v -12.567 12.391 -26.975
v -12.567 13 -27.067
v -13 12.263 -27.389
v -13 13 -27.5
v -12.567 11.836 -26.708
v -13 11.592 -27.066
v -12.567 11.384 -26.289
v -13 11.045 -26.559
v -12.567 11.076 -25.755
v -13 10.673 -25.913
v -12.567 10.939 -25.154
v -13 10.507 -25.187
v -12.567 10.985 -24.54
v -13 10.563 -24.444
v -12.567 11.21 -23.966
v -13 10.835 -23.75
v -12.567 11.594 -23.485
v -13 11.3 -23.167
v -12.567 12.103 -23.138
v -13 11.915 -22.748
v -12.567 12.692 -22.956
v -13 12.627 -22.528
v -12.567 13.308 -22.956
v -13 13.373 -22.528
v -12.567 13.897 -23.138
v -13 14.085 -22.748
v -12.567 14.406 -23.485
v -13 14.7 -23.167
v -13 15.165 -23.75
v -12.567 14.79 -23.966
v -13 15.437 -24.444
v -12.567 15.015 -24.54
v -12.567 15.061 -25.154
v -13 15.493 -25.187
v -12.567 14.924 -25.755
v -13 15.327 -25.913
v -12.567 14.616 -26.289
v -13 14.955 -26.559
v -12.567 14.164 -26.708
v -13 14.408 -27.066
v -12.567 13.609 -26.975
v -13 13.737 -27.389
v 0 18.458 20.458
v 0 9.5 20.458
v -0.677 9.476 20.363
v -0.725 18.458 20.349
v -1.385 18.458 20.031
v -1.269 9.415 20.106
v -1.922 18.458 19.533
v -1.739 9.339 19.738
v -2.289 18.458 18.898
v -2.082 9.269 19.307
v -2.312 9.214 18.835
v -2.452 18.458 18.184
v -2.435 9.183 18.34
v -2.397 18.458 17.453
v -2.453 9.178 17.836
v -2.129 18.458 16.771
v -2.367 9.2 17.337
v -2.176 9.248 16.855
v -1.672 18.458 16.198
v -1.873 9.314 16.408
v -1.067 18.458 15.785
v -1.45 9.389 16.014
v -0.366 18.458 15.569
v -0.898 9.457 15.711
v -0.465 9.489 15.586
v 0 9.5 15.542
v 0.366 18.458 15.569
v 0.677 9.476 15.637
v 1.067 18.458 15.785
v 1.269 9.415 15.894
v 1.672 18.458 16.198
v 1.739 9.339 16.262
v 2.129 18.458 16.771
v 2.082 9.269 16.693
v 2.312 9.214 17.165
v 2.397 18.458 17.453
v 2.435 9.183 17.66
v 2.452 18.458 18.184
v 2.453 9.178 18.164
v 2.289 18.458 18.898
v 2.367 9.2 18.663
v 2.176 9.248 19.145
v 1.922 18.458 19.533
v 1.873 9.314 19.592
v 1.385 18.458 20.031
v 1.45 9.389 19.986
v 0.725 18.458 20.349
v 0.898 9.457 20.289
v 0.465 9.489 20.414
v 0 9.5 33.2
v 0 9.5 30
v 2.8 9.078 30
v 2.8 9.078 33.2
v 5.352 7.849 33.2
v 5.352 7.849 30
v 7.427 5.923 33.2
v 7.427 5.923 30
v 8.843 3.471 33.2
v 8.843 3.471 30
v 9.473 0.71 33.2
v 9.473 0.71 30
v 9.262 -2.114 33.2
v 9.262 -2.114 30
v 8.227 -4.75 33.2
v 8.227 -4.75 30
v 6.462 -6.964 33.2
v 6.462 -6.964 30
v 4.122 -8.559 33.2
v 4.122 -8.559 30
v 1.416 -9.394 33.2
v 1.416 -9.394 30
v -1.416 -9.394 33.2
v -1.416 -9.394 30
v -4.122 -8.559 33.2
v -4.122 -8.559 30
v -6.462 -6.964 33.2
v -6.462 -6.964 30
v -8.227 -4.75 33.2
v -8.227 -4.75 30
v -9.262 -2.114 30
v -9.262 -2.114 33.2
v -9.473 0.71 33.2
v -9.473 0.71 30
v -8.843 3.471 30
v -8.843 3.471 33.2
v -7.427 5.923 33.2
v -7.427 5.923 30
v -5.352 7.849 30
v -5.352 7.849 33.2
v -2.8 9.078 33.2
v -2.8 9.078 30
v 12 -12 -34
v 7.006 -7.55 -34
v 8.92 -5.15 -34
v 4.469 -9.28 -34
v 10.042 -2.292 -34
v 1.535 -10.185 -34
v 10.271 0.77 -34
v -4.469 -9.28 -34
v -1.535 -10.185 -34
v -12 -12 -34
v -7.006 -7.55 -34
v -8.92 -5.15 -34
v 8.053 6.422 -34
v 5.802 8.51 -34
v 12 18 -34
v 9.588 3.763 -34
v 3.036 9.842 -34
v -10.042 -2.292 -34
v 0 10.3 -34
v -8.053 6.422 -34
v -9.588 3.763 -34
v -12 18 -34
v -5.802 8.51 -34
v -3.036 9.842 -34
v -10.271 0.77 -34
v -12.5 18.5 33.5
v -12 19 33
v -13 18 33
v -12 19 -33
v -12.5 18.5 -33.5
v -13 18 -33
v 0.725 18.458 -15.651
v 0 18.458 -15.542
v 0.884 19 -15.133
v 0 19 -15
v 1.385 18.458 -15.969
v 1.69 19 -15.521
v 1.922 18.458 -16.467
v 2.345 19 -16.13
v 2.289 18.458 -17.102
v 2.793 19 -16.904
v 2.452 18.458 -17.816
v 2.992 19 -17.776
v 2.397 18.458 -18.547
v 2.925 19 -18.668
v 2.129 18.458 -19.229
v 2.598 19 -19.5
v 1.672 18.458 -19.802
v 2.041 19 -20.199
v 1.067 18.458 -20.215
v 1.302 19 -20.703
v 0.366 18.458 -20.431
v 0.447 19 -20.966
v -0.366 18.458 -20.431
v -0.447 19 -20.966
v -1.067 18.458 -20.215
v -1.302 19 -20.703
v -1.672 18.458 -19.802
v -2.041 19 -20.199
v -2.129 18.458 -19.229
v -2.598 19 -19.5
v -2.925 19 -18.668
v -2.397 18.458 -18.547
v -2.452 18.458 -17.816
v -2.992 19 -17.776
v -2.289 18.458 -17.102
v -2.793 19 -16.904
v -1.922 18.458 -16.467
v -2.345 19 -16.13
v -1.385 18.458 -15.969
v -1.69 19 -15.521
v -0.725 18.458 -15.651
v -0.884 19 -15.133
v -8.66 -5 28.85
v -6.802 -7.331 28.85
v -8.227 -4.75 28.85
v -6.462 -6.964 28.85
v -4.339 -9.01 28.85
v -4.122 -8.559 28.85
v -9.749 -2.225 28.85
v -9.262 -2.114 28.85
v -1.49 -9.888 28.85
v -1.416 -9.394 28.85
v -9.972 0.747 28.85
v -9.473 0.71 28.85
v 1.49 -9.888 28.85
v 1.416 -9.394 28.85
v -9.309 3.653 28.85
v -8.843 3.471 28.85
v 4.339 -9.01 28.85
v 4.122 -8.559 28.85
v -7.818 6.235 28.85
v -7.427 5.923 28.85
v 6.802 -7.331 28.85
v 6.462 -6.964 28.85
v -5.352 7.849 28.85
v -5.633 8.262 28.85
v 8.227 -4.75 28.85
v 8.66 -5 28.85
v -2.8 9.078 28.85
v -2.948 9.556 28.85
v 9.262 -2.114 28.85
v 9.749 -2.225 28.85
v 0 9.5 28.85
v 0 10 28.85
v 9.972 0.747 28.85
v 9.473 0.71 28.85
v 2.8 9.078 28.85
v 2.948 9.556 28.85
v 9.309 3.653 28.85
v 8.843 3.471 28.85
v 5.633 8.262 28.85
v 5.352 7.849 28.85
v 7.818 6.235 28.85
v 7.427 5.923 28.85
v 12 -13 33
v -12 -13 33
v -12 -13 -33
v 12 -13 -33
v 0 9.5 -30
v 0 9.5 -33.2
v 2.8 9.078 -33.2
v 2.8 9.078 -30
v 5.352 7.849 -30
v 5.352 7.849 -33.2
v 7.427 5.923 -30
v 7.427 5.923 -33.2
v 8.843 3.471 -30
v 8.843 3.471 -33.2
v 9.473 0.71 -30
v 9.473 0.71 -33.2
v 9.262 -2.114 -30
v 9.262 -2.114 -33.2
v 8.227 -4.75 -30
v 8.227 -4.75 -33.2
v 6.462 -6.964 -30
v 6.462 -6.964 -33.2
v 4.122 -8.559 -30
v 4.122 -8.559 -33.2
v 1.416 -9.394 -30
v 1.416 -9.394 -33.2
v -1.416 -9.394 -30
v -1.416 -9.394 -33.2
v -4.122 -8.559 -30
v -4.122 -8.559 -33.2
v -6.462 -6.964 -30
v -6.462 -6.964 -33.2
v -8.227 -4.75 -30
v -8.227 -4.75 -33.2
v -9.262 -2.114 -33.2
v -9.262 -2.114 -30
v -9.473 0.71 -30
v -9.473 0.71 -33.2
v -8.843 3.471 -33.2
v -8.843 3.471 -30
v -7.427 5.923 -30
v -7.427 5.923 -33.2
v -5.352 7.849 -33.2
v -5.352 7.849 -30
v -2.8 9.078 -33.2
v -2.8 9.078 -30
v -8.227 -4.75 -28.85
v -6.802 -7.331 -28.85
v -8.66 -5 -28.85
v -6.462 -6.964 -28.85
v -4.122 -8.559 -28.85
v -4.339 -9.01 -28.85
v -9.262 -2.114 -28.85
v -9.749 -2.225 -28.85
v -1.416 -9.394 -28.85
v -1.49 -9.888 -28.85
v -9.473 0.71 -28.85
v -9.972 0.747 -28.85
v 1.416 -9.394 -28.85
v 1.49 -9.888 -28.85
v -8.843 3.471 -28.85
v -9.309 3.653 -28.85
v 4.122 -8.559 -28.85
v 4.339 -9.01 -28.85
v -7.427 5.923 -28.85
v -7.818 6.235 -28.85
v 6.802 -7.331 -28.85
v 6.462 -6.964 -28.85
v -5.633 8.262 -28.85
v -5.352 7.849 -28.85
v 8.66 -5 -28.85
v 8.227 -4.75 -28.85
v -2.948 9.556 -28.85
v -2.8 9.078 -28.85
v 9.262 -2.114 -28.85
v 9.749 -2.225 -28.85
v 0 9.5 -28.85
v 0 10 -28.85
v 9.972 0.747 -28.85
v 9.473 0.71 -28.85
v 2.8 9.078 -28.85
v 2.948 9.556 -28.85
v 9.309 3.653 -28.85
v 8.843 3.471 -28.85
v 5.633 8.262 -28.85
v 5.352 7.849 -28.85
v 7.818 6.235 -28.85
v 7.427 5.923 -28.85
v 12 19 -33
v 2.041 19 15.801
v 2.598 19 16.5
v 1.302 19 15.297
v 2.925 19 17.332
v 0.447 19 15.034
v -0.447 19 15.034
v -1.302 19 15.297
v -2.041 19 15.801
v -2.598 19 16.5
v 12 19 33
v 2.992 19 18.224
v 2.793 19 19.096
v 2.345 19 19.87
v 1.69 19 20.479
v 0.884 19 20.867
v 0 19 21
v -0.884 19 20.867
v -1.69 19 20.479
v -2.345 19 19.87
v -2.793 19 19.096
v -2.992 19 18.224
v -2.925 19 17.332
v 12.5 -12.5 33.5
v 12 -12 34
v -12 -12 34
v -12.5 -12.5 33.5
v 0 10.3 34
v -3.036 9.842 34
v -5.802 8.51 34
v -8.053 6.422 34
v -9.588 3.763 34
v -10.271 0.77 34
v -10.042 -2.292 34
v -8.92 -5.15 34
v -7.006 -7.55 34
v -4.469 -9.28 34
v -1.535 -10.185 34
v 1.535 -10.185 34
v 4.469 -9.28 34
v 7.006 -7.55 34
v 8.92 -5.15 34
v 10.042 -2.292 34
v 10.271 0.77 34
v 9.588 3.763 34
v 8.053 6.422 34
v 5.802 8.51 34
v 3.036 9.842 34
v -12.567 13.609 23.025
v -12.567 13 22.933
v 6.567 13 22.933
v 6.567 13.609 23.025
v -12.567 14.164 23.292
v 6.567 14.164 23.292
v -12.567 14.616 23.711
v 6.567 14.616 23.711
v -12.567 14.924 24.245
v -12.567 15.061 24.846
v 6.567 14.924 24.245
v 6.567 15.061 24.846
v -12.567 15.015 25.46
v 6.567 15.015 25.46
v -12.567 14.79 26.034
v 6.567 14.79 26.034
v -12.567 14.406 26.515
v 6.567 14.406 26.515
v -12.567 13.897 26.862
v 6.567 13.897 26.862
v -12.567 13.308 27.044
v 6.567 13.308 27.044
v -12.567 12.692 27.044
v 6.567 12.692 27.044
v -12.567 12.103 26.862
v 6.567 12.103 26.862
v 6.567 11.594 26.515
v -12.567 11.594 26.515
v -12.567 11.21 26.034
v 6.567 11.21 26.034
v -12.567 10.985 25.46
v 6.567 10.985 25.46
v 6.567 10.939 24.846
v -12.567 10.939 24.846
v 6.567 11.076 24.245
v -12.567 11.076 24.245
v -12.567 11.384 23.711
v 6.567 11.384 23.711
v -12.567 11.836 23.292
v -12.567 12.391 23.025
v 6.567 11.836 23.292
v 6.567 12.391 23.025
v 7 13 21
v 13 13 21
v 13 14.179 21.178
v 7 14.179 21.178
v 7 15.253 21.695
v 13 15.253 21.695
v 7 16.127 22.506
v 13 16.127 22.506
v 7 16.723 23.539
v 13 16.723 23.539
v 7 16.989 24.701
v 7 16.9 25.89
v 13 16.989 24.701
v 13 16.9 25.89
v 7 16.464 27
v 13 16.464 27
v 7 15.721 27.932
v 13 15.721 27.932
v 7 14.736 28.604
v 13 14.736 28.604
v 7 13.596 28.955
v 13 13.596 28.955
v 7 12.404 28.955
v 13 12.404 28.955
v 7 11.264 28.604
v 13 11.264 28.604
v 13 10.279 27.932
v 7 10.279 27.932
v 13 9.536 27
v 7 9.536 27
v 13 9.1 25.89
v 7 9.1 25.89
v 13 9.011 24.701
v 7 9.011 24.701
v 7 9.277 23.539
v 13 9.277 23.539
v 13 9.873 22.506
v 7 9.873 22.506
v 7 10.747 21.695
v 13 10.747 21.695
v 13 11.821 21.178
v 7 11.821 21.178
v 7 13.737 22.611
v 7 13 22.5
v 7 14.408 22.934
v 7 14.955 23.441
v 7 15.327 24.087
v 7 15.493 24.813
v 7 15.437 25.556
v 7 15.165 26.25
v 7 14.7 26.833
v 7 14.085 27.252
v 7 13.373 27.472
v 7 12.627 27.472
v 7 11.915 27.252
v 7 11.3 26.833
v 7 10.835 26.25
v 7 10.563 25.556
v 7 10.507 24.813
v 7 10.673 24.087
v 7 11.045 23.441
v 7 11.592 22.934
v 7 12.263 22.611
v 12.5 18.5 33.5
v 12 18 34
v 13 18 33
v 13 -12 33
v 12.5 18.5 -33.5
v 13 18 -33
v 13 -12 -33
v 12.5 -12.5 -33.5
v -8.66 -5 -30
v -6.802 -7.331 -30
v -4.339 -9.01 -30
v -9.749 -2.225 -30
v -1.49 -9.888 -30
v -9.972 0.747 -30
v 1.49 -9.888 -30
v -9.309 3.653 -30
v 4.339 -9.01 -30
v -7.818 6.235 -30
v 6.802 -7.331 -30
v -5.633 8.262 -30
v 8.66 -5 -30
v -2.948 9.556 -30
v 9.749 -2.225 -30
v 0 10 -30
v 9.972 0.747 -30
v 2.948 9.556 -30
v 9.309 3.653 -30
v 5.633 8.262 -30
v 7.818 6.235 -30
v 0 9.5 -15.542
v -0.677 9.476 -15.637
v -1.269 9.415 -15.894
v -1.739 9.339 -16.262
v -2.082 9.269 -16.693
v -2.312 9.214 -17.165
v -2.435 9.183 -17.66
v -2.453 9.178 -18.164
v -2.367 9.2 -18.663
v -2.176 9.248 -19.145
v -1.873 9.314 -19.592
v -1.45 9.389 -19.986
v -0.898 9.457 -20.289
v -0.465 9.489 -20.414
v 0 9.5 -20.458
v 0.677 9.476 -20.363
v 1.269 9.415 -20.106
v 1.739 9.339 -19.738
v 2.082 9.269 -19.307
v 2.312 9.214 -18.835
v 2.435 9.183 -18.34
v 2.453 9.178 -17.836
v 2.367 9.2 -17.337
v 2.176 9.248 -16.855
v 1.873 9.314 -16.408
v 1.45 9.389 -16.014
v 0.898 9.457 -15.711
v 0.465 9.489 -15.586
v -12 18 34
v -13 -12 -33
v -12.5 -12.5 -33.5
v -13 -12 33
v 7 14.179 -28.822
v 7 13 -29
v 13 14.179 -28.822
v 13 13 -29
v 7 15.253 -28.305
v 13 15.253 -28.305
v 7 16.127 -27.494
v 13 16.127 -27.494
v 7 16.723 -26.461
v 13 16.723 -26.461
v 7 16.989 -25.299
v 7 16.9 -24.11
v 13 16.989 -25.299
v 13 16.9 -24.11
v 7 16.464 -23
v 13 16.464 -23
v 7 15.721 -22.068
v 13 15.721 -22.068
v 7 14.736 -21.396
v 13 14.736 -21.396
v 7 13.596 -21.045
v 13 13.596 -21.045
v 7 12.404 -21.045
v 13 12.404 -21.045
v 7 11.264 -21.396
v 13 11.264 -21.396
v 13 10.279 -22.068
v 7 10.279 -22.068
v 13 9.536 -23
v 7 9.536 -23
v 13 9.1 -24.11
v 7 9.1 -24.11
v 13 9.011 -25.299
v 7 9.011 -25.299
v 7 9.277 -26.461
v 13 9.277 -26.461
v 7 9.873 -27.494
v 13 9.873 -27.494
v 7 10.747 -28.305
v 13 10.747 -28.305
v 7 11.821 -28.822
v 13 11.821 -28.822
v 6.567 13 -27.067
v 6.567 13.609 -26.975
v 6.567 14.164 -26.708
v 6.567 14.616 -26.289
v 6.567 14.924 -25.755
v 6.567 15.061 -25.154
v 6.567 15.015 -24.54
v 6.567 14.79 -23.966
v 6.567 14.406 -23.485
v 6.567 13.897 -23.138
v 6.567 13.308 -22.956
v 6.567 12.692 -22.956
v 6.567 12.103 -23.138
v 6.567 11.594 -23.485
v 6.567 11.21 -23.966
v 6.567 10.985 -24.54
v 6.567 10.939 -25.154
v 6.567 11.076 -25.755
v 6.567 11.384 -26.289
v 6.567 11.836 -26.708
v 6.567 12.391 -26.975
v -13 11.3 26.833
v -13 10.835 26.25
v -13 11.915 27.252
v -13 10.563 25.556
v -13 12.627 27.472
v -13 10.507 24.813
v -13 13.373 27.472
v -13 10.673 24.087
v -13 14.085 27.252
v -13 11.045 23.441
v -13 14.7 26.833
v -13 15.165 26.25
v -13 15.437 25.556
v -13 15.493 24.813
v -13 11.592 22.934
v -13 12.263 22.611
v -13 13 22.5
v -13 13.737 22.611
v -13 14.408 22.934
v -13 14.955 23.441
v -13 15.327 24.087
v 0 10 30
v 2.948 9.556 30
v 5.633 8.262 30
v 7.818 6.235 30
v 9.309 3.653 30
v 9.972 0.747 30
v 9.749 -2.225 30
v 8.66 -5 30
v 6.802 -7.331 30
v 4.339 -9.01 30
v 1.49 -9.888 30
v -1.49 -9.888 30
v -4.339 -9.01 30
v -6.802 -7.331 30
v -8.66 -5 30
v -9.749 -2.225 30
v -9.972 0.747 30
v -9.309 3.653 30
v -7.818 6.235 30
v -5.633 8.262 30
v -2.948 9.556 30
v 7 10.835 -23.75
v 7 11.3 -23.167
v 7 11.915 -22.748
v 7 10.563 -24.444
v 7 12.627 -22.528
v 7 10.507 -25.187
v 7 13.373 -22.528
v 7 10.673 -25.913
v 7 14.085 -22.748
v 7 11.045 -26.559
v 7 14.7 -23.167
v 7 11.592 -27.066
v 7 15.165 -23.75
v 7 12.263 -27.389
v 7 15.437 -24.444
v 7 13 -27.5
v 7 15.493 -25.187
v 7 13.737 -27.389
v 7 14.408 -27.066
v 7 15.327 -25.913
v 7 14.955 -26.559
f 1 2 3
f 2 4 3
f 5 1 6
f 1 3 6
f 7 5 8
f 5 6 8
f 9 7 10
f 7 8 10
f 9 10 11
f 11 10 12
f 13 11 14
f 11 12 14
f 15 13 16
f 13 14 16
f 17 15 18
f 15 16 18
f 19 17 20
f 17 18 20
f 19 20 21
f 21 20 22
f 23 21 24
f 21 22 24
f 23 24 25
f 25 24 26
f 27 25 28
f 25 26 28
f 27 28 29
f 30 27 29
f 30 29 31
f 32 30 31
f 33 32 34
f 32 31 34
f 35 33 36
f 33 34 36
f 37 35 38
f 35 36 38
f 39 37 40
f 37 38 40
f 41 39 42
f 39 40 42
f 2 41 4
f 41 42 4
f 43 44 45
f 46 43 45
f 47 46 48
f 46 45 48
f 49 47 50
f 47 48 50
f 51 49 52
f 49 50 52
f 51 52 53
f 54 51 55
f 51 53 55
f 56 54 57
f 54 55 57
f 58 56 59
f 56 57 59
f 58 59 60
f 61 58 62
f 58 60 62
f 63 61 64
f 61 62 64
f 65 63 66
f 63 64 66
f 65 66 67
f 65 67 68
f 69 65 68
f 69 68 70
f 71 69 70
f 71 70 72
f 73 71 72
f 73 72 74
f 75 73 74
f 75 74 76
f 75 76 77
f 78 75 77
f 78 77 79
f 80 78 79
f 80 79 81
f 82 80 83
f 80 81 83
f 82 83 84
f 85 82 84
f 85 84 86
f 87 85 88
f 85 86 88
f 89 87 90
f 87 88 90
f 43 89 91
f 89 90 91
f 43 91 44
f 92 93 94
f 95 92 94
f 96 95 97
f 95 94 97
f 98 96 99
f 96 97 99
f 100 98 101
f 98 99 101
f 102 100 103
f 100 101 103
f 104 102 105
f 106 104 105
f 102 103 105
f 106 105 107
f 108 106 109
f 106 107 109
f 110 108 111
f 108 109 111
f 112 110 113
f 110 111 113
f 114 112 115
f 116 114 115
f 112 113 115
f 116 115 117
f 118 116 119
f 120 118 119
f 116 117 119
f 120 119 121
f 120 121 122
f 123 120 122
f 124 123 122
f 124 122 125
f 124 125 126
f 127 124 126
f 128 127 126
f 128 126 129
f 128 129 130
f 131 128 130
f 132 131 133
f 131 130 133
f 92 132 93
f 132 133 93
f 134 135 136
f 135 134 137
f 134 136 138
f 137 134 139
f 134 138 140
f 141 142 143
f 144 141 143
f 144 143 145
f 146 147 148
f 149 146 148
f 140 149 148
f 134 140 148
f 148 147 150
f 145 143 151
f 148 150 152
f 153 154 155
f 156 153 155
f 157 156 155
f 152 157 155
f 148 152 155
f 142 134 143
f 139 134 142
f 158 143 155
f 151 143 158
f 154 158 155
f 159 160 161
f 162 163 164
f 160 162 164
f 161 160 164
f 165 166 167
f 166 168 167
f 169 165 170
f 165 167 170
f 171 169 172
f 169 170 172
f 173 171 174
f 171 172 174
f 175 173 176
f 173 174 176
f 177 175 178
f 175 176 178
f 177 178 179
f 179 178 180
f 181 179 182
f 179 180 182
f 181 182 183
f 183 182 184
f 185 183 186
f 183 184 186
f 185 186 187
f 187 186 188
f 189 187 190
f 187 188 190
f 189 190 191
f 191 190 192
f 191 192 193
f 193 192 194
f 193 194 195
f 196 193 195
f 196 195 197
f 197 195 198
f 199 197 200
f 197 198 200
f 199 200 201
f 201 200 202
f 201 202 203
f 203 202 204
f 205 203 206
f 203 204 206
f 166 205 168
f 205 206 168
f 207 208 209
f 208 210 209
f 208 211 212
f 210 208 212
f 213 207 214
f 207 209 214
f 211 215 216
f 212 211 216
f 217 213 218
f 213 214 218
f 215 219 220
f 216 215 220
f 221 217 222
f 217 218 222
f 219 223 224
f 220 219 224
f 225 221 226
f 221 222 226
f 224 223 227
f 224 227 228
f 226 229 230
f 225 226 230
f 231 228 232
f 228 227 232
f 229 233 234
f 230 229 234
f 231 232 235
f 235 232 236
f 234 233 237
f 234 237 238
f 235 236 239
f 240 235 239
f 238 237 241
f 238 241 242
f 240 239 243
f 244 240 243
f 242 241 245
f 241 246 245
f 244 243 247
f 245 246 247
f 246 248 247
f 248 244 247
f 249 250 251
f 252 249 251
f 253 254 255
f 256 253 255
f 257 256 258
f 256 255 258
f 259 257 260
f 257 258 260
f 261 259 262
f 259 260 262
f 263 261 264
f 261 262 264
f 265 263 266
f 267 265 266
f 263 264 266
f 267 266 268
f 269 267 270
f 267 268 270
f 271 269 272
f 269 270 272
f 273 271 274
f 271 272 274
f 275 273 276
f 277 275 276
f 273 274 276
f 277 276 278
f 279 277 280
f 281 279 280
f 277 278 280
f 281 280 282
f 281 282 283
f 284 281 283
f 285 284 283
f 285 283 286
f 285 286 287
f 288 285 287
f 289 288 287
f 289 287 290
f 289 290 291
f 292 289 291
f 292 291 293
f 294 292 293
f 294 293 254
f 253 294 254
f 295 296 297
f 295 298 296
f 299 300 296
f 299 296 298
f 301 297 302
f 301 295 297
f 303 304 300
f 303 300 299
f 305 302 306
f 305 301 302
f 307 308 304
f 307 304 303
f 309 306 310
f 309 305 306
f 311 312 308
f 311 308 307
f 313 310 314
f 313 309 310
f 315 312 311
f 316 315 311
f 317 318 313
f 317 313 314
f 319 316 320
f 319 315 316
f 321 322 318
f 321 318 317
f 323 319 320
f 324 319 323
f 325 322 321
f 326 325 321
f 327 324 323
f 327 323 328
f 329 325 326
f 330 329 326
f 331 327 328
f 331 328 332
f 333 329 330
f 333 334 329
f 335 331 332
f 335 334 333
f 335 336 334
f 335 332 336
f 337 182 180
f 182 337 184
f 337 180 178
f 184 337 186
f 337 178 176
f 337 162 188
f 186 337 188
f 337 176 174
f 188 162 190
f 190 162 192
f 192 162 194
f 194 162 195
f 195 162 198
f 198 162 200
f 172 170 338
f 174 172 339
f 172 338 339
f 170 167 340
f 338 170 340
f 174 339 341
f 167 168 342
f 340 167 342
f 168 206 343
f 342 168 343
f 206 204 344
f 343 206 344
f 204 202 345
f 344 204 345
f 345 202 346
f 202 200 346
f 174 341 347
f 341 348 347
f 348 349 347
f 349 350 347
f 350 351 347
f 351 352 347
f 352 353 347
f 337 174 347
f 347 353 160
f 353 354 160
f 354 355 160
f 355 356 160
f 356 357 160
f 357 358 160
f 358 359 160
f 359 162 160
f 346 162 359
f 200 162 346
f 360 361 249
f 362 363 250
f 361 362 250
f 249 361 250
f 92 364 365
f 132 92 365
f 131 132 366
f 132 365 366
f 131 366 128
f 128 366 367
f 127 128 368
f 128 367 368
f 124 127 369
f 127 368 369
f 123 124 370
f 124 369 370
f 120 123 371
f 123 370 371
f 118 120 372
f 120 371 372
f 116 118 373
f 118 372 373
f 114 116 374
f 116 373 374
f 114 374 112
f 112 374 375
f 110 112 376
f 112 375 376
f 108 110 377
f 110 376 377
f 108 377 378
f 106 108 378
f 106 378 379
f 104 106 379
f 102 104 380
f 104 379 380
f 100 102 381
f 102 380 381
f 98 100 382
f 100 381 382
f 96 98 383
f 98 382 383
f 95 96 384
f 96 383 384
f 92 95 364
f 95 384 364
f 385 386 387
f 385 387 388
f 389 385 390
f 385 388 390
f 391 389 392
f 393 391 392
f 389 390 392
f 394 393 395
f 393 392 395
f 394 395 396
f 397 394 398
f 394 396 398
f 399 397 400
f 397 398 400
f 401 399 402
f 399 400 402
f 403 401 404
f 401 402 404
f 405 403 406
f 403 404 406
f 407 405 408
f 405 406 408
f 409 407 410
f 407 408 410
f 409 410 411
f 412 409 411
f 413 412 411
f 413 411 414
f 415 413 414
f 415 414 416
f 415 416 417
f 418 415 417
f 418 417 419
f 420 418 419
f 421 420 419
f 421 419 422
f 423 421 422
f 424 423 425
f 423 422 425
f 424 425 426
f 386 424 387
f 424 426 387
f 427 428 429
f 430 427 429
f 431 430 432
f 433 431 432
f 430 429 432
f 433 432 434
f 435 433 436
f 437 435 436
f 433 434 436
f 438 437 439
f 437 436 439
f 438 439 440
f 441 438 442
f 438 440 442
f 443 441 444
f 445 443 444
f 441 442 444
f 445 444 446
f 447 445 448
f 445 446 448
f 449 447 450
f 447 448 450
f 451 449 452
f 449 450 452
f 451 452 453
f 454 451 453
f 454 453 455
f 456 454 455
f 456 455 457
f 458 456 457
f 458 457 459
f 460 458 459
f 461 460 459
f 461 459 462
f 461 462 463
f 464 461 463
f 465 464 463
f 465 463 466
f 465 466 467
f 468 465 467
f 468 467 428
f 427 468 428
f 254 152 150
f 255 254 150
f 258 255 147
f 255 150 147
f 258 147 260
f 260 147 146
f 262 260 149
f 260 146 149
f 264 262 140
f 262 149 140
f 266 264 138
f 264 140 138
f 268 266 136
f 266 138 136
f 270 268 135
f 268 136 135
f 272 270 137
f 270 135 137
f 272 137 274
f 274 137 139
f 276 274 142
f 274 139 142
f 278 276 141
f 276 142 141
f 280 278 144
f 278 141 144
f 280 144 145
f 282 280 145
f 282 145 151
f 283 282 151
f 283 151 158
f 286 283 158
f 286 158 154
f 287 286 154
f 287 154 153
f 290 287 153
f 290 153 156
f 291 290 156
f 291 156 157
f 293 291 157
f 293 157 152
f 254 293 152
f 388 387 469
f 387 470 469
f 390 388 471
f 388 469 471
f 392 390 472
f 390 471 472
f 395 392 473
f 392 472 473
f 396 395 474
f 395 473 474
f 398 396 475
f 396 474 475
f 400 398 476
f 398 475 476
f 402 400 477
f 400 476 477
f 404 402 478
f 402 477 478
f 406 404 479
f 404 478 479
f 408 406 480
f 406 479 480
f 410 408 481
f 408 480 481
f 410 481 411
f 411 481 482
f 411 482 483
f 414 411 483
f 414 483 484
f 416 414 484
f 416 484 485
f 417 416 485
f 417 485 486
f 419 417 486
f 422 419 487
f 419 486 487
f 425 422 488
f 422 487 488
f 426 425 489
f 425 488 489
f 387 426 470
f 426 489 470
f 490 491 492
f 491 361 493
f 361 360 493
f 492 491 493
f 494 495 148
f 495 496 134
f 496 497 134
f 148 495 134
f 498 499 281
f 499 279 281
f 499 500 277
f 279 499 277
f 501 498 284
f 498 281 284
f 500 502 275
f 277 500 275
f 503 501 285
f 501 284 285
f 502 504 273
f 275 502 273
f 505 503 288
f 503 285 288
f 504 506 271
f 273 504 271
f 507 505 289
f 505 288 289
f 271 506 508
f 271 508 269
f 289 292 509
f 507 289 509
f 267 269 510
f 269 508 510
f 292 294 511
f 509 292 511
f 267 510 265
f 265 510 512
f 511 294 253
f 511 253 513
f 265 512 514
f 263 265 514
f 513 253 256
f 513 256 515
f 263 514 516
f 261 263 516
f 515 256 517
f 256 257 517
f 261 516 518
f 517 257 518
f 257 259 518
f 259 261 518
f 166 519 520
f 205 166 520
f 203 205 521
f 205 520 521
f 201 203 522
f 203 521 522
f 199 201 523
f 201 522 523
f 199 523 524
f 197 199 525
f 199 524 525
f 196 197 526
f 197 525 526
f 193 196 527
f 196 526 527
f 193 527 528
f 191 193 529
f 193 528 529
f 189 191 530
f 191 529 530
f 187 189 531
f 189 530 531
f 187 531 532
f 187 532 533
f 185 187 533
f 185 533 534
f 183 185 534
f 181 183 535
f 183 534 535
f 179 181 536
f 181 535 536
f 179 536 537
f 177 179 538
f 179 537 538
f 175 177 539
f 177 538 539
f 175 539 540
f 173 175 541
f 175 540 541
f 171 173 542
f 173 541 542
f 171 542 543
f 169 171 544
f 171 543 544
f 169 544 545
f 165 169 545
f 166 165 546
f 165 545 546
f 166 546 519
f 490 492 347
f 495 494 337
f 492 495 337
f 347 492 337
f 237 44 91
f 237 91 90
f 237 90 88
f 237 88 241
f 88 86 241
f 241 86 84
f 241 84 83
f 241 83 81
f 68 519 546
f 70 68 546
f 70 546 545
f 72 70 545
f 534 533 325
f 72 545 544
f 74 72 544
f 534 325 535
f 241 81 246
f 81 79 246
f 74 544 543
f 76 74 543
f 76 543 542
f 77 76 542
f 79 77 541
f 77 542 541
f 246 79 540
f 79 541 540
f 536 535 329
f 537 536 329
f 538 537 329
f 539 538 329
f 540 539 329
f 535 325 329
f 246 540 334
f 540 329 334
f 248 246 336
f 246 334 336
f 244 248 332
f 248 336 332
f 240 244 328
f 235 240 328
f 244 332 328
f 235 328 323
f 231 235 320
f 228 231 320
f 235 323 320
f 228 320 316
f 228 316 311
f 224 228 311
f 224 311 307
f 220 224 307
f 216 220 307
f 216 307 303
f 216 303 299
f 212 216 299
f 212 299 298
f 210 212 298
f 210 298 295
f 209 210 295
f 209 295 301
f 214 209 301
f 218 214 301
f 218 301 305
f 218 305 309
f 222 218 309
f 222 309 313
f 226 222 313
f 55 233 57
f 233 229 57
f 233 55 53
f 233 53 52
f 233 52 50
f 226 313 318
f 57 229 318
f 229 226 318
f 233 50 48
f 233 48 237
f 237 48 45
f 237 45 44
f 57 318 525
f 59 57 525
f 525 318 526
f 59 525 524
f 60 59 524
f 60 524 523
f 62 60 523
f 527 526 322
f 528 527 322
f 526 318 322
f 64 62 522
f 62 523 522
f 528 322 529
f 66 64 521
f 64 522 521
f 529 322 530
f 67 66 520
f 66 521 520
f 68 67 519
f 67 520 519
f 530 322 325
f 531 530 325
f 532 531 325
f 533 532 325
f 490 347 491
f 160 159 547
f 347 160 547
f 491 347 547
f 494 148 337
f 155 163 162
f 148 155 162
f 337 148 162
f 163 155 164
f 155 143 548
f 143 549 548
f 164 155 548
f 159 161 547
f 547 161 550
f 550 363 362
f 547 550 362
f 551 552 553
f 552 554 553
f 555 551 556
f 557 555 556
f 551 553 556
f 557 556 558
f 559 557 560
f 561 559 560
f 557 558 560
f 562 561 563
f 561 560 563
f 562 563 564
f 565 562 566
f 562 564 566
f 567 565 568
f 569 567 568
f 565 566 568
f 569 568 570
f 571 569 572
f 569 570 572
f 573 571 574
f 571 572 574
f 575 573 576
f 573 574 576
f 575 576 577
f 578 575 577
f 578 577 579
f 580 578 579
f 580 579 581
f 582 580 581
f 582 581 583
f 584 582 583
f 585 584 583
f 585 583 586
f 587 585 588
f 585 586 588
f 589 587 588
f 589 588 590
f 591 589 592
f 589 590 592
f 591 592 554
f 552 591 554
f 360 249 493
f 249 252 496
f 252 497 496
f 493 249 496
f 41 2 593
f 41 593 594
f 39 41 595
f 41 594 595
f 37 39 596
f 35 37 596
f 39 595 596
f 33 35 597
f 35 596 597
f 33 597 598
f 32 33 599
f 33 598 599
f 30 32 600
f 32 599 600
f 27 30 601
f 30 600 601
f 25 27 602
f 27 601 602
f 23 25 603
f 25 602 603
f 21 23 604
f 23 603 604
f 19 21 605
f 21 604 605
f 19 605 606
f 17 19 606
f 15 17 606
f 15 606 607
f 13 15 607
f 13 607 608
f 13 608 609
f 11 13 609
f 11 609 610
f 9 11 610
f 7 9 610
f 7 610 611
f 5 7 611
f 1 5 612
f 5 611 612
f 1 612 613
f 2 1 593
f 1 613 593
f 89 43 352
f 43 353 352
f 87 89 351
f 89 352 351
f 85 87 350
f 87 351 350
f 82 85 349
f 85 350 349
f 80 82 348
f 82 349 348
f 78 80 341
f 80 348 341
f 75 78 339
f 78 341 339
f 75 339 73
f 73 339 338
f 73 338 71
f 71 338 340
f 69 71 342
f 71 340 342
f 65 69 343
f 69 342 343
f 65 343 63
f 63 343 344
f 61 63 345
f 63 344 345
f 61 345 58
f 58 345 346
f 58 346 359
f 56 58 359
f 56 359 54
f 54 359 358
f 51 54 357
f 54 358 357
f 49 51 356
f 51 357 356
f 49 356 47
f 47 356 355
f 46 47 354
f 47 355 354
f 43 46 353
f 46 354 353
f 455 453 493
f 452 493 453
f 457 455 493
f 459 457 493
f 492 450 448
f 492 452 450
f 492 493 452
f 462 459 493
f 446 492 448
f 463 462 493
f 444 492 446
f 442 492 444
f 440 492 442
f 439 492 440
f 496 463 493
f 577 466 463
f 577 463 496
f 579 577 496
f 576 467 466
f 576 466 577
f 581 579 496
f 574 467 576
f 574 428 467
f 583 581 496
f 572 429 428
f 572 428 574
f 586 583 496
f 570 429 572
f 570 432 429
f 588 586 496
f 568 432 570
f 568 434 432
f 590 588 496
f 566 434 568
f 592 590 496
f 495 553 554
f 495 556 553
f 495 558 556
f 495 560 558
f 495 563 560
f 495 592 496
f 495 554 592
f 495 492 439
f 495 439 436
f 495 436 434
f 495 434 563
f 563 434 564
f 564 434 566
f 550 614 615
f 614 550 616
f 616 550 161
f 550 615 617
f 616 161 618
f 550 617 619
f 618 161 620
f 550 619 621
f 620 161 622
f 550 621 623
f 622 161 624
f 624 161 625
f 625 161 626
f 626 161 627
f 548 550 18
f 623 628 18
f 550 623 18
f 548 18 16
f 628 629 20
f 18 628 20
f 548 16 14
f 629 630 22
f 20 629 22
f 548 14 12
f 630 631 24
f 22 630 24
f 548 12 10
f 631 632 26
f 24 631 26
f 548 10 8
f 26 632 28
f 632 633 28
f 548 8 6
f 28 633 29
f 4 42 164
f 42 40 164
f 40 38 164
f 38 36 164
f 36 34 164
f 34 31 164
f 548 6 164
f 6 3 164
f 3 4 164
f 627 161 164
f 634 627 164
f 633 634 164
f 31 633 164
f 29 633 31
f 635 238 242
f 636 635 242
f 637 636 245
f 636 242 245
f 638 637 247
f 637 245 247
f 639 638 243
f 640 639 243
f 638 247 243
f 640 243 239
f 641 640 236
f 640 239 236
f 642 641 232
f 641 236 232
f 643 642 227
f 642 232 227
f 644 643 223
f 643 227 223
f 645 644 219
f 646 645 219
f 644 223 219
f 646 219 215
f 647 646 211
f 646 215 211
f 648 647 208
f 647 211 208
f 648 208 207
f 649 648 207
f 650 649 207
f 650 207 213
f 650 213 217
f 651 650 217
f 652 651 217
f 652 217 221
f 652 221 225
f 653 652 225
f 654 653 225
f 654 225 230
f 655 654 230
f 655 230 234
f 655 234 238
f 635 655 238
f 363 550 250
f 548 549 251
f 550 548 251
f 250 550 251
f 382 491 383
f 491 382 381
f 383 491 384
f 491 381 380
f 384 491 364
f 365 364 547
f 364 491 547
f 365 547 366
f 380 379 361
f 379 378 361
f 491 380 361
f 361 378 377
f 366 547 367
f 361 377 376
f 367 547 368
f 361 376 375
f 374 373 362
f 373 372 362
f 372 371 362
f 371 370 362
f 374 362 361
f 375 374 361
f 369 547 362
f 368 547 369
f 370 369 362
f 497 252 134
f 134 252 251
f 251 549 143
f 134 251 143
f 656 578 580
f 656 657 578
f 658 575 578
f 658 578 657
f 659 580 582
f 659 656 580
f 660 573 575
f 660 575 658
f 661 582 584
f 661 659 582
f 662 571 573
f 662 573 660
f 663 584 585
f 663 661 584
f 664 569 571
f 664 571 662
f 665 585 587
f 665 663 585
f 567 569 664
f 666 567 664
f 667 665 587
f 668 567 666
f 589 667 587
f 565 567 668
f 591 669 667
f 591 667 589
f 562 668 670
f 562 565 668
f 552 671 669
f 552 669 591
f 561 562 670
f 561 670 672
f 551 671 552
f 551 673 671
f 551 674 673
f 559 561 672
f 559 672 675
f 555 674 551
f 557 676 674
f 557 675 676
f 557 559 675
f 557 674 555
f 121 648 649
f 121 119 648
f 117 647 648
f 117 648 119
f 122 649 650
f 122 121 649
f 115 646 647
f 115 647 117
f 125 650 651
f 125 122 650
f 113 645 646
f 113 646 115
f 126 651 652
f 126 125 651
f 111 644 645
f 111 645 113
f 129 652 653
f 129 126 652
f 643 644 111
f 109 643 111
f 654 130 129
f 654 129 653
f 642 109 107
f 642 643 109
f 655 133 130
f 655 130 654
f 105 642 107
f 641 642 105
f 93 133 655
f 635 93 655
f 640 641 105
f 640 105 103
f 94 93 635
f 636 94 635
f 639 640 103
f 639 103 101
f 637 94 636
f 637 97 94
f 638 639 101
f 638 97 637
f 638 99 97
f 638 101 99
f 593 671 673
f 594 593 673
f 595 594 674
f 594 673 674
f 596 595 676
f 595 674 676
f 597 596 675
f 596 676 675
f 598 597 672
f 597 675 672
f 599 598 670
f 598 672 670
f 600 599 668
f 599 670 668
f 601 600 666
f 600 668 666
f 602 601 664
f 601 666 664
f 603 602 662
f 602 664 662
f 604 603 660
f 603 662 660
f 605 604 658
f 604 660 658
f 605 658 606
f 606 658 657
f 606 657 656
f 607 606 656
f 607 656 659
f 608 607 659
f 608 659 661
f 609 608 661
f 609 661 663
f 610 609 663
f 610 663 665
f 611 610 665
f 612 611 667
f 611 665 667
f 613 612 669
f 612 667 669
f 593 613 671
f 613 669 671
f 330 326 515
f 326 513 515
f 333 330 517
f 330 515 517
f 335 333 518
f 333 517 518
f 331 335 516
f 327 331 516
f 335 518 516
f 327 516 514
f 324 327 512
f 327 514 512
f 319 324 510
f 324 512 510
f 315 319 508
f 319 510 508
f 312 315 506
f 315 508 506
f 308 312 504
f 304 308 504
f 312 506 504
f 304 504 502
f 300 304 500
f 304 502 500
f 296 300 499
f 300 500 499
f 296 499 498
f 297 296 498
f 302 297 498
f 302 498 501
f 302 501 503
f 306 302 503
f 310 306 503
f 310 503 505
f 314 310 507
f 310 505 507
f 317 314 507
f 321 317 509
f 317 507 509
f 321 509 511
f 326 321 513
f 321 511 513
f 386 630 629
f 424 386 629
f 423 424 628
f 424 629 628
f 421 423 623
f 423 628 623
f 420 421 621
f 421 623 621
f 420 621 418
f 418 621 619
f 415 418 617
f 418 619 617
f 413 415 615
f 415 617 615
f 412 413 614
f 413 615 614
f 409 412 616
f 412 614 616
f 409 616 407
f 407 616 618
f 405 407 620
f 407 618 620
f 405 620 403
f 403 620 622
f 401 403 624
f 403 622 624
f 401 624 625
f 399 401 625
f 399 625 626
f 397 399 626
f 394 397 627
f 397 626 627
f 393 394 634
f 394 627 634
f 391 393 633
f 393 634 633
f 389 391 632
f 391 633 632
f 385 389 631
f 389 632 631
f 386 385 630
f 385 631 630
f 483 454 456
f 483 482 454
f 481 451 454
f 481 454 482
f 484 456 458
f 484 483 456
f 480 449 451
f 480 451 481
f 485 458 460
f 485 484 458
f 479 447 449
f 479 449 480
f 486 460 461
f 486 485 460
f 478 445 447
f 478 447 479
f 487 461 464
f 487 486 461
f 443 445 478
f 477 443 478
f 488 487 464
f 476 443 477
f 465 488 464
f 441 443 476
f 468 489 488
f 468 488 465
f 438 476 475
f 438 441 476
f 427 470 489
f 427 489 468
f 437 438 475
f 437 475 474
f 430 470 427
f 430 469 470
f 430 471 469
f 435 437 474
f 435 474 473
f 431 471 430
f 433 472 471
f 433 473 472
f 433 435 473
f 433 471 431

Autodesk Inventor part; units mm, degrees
sketch "Sketch_8" plane through (0, 0, 0) normal (1, 0, 0) x (0, 0, -1)
  line L0 (-34, 18) -> (-34, -12)
  line L1 (-34, -12) -> (-33, -13)
  line L2 (-33, -13) -> (33, -13)
  line L3 (33, -13) -> (34, -12)
  line L4 (34, -12) -> (34, 18)
  line L5 (34, 18) -> (33, 19)
  line L6 (33, 19) -> (-33, 19)
  line L7 (-33, 19) -> (-34, 18)
extrude "Extrusion1" add sketch "Sketch_8" along normal mid plane 26
sketch "_____1" plane through (0, 0, 0) normal (0, 0, 1) x (1, 0, 0)
  line L0 (-14, -14) -> (14, -14)
  line L1 (14, -14) -> (14, 20)
  line L2 (14, 20) -> (-14, 20)
  line L3 (-14, 20) -> (-14, -14)
  line L4 (-13, 18) -> (-13, -12)
  line L5 (-13, -12) -> (-12, -13)
  line L6 (-12, -13) -> (12, -13)
  line L7 (12, -13) -> (13, -12)
  line L8 (13, -12) -> (13, 18)
  line L9 (13, 18) -> (12, 19)
  line L10 (12, 19) -> (-12, 19)
  line L11 (-12, 19) -> (-13, 18)
extrude "Extrusion2" cut sketch "_____1" along normal mid plane 68
sketch "_____2" plane through (0, 0, 0) normal (0, 1, 0) x (1, 0, 0)
  line L0 (-14, -35) -> (14, -35)
  line L1 (14, -35) -> (14, 35)
  line L2 (14, 35) -> (-14, 35)
  line L3 (-14, 35) -> (-14, -35)
  line L4 (-13, 33) -> (-13, -33)
  line L5 (-13, -33) -> (-12, -34)
  line L6 (-12, -34) -> (12, -34)
  line L7 (12, -34) -> (13, -33)
  line L8 (13, -33) -> (13, 33)
  line L9 (13, 33) -> (12, 34)
  line L10 (12, 34) -> (-12, 34)
  line L11 (-12, 34) -> (-13, 33)
extrude "Extrusion3" cut sketch "_____2" along normal mid plane 64
sketch "Sketch_1" plane through (0, 0, 0) normal (1, 0, 0) x (0, 0, -1)
  line L0 (34, 0) -> (-34, 0)
  line L1 (-34, 0) -> (-34, 10.3)
  line L2 (-34, 10.3) -> (-33.2, 9.5)
  line L3 (-33.2, 9.5) -> (-30, 9.5)
  line L4 (-30, 9.5) -> (-30, 10)
  line L5 (-30, 10) -> (-28.85, 10)
  line L6 (-28.85, 10) -> (-28.85, 9.5)
  line L7 (-28.85, 9.5) -> (28.85, 9.5)
  line L8 (28.85, 9.5) -> (28.85, 10)
  line L9 (28.85, 10) -> (30, 10)
  line L10 (30, 10) -> (30, 9.5)
  line L11 (30, 9.5) -> (33.2, 9.5)
  line L12 (33.2, 9.5) -> (34, 10.3)
  line L13 (34, 10.3) -> (34, 0)
  line L14 (34, 0) -> (-34, 0)
revolve "Revolution1" cut sketch "Sketch_1" angle 360 about axis through (0, 0, -34) along (0, 0, -1)
sketch "Sketch5" plane through (-12, 19, -33) normal (0, 1, 0) x (1, 0, 0)
  point P0 (12, -15)
hole "Hole1" at (0, 19, -18) direction (0, -1, 0) diameter 4.917 depth 19 countersink diameter 6 countersink angle 90 thread size "M6x1" class "6H" standard "ISO Metric profile"
pattern_linear "Rectangular Pattern1" count 2 spacing 36 along (0, 0, 1) of "Hole1"
sketch "Sketch_3" plane through (0, 13, 0) normal (0, 1, 0) x (1, 0, 0)
  line L0 (13, 25) -> (-13, 25)
  line L1 (-13, 25) -> (-13, 27.5)
  line L2 (-13, 27.5) -> (-12.567, 27.067)
  line L3 (-12.567, 27.067) -> (6.567, 27.067)
  line L4 (6.567, 27.067) -> (7, 27.5)
  line L5 (7, 27.5) -> (7, 29)
  line L6 (7, 29) -> (13, 29)
  line L7 (13, 29) -> (13, 25)
  line L8 (13, 25) -> (-13, 25)
revolve "Revolution2" cut sketch "Sketch_3" angle 360 about axis through (13, 13, -25) along (1, 0, 0)
thread "Thread1" size "M5x0.8" class "6H" standard "ISO Metric profile" full length
pattern_linear "Rectangular Pattern2" count 2 spacing 50 along (0, 0, 1) of "Revolution2"
ref_plane "to_bushings_XY" through (0, 0, 0) normal (0, 0, 1) x (1, 0, 0)
ref_plane "to_bushings_YZ" through (0, 0, 0) normal (1, 0, 0) x (0, 1, 0)
ref_plane "to_bushings_ZX" through (0, 0, 0) normal (0, 1, 0) x (0, 0, 1)
ref_plane "to_rring_l_XY" through (0, 0, 28.85) normal (0, 0, -1) x (1, 0, 0)
ref_plane "to_rring_l_YZ" through (0, 0, 28.85) normal (1, 0, 0) x (0, -1, 0)
ref_plane "to_rring_l_ZX" through (0, 0, 28.85) normal (0, -1, 0) x (0, 0, -1)
ref_plane "to_rring_r_XY" through (0, 0, -28.85) normal (0, 0, 1) x (-1, 0, 0)
ref_plane "to_rring_r_YZ" through (0, 0, -28.85) normal (-1, 0, 0) x (0, -1, 0)
ref_plane "to_rring_r_ZX" through (0, 0, -28.85) normal (0, -1, 0) x (0, 0, 1)
properties part number "SLHSSW10_b"
